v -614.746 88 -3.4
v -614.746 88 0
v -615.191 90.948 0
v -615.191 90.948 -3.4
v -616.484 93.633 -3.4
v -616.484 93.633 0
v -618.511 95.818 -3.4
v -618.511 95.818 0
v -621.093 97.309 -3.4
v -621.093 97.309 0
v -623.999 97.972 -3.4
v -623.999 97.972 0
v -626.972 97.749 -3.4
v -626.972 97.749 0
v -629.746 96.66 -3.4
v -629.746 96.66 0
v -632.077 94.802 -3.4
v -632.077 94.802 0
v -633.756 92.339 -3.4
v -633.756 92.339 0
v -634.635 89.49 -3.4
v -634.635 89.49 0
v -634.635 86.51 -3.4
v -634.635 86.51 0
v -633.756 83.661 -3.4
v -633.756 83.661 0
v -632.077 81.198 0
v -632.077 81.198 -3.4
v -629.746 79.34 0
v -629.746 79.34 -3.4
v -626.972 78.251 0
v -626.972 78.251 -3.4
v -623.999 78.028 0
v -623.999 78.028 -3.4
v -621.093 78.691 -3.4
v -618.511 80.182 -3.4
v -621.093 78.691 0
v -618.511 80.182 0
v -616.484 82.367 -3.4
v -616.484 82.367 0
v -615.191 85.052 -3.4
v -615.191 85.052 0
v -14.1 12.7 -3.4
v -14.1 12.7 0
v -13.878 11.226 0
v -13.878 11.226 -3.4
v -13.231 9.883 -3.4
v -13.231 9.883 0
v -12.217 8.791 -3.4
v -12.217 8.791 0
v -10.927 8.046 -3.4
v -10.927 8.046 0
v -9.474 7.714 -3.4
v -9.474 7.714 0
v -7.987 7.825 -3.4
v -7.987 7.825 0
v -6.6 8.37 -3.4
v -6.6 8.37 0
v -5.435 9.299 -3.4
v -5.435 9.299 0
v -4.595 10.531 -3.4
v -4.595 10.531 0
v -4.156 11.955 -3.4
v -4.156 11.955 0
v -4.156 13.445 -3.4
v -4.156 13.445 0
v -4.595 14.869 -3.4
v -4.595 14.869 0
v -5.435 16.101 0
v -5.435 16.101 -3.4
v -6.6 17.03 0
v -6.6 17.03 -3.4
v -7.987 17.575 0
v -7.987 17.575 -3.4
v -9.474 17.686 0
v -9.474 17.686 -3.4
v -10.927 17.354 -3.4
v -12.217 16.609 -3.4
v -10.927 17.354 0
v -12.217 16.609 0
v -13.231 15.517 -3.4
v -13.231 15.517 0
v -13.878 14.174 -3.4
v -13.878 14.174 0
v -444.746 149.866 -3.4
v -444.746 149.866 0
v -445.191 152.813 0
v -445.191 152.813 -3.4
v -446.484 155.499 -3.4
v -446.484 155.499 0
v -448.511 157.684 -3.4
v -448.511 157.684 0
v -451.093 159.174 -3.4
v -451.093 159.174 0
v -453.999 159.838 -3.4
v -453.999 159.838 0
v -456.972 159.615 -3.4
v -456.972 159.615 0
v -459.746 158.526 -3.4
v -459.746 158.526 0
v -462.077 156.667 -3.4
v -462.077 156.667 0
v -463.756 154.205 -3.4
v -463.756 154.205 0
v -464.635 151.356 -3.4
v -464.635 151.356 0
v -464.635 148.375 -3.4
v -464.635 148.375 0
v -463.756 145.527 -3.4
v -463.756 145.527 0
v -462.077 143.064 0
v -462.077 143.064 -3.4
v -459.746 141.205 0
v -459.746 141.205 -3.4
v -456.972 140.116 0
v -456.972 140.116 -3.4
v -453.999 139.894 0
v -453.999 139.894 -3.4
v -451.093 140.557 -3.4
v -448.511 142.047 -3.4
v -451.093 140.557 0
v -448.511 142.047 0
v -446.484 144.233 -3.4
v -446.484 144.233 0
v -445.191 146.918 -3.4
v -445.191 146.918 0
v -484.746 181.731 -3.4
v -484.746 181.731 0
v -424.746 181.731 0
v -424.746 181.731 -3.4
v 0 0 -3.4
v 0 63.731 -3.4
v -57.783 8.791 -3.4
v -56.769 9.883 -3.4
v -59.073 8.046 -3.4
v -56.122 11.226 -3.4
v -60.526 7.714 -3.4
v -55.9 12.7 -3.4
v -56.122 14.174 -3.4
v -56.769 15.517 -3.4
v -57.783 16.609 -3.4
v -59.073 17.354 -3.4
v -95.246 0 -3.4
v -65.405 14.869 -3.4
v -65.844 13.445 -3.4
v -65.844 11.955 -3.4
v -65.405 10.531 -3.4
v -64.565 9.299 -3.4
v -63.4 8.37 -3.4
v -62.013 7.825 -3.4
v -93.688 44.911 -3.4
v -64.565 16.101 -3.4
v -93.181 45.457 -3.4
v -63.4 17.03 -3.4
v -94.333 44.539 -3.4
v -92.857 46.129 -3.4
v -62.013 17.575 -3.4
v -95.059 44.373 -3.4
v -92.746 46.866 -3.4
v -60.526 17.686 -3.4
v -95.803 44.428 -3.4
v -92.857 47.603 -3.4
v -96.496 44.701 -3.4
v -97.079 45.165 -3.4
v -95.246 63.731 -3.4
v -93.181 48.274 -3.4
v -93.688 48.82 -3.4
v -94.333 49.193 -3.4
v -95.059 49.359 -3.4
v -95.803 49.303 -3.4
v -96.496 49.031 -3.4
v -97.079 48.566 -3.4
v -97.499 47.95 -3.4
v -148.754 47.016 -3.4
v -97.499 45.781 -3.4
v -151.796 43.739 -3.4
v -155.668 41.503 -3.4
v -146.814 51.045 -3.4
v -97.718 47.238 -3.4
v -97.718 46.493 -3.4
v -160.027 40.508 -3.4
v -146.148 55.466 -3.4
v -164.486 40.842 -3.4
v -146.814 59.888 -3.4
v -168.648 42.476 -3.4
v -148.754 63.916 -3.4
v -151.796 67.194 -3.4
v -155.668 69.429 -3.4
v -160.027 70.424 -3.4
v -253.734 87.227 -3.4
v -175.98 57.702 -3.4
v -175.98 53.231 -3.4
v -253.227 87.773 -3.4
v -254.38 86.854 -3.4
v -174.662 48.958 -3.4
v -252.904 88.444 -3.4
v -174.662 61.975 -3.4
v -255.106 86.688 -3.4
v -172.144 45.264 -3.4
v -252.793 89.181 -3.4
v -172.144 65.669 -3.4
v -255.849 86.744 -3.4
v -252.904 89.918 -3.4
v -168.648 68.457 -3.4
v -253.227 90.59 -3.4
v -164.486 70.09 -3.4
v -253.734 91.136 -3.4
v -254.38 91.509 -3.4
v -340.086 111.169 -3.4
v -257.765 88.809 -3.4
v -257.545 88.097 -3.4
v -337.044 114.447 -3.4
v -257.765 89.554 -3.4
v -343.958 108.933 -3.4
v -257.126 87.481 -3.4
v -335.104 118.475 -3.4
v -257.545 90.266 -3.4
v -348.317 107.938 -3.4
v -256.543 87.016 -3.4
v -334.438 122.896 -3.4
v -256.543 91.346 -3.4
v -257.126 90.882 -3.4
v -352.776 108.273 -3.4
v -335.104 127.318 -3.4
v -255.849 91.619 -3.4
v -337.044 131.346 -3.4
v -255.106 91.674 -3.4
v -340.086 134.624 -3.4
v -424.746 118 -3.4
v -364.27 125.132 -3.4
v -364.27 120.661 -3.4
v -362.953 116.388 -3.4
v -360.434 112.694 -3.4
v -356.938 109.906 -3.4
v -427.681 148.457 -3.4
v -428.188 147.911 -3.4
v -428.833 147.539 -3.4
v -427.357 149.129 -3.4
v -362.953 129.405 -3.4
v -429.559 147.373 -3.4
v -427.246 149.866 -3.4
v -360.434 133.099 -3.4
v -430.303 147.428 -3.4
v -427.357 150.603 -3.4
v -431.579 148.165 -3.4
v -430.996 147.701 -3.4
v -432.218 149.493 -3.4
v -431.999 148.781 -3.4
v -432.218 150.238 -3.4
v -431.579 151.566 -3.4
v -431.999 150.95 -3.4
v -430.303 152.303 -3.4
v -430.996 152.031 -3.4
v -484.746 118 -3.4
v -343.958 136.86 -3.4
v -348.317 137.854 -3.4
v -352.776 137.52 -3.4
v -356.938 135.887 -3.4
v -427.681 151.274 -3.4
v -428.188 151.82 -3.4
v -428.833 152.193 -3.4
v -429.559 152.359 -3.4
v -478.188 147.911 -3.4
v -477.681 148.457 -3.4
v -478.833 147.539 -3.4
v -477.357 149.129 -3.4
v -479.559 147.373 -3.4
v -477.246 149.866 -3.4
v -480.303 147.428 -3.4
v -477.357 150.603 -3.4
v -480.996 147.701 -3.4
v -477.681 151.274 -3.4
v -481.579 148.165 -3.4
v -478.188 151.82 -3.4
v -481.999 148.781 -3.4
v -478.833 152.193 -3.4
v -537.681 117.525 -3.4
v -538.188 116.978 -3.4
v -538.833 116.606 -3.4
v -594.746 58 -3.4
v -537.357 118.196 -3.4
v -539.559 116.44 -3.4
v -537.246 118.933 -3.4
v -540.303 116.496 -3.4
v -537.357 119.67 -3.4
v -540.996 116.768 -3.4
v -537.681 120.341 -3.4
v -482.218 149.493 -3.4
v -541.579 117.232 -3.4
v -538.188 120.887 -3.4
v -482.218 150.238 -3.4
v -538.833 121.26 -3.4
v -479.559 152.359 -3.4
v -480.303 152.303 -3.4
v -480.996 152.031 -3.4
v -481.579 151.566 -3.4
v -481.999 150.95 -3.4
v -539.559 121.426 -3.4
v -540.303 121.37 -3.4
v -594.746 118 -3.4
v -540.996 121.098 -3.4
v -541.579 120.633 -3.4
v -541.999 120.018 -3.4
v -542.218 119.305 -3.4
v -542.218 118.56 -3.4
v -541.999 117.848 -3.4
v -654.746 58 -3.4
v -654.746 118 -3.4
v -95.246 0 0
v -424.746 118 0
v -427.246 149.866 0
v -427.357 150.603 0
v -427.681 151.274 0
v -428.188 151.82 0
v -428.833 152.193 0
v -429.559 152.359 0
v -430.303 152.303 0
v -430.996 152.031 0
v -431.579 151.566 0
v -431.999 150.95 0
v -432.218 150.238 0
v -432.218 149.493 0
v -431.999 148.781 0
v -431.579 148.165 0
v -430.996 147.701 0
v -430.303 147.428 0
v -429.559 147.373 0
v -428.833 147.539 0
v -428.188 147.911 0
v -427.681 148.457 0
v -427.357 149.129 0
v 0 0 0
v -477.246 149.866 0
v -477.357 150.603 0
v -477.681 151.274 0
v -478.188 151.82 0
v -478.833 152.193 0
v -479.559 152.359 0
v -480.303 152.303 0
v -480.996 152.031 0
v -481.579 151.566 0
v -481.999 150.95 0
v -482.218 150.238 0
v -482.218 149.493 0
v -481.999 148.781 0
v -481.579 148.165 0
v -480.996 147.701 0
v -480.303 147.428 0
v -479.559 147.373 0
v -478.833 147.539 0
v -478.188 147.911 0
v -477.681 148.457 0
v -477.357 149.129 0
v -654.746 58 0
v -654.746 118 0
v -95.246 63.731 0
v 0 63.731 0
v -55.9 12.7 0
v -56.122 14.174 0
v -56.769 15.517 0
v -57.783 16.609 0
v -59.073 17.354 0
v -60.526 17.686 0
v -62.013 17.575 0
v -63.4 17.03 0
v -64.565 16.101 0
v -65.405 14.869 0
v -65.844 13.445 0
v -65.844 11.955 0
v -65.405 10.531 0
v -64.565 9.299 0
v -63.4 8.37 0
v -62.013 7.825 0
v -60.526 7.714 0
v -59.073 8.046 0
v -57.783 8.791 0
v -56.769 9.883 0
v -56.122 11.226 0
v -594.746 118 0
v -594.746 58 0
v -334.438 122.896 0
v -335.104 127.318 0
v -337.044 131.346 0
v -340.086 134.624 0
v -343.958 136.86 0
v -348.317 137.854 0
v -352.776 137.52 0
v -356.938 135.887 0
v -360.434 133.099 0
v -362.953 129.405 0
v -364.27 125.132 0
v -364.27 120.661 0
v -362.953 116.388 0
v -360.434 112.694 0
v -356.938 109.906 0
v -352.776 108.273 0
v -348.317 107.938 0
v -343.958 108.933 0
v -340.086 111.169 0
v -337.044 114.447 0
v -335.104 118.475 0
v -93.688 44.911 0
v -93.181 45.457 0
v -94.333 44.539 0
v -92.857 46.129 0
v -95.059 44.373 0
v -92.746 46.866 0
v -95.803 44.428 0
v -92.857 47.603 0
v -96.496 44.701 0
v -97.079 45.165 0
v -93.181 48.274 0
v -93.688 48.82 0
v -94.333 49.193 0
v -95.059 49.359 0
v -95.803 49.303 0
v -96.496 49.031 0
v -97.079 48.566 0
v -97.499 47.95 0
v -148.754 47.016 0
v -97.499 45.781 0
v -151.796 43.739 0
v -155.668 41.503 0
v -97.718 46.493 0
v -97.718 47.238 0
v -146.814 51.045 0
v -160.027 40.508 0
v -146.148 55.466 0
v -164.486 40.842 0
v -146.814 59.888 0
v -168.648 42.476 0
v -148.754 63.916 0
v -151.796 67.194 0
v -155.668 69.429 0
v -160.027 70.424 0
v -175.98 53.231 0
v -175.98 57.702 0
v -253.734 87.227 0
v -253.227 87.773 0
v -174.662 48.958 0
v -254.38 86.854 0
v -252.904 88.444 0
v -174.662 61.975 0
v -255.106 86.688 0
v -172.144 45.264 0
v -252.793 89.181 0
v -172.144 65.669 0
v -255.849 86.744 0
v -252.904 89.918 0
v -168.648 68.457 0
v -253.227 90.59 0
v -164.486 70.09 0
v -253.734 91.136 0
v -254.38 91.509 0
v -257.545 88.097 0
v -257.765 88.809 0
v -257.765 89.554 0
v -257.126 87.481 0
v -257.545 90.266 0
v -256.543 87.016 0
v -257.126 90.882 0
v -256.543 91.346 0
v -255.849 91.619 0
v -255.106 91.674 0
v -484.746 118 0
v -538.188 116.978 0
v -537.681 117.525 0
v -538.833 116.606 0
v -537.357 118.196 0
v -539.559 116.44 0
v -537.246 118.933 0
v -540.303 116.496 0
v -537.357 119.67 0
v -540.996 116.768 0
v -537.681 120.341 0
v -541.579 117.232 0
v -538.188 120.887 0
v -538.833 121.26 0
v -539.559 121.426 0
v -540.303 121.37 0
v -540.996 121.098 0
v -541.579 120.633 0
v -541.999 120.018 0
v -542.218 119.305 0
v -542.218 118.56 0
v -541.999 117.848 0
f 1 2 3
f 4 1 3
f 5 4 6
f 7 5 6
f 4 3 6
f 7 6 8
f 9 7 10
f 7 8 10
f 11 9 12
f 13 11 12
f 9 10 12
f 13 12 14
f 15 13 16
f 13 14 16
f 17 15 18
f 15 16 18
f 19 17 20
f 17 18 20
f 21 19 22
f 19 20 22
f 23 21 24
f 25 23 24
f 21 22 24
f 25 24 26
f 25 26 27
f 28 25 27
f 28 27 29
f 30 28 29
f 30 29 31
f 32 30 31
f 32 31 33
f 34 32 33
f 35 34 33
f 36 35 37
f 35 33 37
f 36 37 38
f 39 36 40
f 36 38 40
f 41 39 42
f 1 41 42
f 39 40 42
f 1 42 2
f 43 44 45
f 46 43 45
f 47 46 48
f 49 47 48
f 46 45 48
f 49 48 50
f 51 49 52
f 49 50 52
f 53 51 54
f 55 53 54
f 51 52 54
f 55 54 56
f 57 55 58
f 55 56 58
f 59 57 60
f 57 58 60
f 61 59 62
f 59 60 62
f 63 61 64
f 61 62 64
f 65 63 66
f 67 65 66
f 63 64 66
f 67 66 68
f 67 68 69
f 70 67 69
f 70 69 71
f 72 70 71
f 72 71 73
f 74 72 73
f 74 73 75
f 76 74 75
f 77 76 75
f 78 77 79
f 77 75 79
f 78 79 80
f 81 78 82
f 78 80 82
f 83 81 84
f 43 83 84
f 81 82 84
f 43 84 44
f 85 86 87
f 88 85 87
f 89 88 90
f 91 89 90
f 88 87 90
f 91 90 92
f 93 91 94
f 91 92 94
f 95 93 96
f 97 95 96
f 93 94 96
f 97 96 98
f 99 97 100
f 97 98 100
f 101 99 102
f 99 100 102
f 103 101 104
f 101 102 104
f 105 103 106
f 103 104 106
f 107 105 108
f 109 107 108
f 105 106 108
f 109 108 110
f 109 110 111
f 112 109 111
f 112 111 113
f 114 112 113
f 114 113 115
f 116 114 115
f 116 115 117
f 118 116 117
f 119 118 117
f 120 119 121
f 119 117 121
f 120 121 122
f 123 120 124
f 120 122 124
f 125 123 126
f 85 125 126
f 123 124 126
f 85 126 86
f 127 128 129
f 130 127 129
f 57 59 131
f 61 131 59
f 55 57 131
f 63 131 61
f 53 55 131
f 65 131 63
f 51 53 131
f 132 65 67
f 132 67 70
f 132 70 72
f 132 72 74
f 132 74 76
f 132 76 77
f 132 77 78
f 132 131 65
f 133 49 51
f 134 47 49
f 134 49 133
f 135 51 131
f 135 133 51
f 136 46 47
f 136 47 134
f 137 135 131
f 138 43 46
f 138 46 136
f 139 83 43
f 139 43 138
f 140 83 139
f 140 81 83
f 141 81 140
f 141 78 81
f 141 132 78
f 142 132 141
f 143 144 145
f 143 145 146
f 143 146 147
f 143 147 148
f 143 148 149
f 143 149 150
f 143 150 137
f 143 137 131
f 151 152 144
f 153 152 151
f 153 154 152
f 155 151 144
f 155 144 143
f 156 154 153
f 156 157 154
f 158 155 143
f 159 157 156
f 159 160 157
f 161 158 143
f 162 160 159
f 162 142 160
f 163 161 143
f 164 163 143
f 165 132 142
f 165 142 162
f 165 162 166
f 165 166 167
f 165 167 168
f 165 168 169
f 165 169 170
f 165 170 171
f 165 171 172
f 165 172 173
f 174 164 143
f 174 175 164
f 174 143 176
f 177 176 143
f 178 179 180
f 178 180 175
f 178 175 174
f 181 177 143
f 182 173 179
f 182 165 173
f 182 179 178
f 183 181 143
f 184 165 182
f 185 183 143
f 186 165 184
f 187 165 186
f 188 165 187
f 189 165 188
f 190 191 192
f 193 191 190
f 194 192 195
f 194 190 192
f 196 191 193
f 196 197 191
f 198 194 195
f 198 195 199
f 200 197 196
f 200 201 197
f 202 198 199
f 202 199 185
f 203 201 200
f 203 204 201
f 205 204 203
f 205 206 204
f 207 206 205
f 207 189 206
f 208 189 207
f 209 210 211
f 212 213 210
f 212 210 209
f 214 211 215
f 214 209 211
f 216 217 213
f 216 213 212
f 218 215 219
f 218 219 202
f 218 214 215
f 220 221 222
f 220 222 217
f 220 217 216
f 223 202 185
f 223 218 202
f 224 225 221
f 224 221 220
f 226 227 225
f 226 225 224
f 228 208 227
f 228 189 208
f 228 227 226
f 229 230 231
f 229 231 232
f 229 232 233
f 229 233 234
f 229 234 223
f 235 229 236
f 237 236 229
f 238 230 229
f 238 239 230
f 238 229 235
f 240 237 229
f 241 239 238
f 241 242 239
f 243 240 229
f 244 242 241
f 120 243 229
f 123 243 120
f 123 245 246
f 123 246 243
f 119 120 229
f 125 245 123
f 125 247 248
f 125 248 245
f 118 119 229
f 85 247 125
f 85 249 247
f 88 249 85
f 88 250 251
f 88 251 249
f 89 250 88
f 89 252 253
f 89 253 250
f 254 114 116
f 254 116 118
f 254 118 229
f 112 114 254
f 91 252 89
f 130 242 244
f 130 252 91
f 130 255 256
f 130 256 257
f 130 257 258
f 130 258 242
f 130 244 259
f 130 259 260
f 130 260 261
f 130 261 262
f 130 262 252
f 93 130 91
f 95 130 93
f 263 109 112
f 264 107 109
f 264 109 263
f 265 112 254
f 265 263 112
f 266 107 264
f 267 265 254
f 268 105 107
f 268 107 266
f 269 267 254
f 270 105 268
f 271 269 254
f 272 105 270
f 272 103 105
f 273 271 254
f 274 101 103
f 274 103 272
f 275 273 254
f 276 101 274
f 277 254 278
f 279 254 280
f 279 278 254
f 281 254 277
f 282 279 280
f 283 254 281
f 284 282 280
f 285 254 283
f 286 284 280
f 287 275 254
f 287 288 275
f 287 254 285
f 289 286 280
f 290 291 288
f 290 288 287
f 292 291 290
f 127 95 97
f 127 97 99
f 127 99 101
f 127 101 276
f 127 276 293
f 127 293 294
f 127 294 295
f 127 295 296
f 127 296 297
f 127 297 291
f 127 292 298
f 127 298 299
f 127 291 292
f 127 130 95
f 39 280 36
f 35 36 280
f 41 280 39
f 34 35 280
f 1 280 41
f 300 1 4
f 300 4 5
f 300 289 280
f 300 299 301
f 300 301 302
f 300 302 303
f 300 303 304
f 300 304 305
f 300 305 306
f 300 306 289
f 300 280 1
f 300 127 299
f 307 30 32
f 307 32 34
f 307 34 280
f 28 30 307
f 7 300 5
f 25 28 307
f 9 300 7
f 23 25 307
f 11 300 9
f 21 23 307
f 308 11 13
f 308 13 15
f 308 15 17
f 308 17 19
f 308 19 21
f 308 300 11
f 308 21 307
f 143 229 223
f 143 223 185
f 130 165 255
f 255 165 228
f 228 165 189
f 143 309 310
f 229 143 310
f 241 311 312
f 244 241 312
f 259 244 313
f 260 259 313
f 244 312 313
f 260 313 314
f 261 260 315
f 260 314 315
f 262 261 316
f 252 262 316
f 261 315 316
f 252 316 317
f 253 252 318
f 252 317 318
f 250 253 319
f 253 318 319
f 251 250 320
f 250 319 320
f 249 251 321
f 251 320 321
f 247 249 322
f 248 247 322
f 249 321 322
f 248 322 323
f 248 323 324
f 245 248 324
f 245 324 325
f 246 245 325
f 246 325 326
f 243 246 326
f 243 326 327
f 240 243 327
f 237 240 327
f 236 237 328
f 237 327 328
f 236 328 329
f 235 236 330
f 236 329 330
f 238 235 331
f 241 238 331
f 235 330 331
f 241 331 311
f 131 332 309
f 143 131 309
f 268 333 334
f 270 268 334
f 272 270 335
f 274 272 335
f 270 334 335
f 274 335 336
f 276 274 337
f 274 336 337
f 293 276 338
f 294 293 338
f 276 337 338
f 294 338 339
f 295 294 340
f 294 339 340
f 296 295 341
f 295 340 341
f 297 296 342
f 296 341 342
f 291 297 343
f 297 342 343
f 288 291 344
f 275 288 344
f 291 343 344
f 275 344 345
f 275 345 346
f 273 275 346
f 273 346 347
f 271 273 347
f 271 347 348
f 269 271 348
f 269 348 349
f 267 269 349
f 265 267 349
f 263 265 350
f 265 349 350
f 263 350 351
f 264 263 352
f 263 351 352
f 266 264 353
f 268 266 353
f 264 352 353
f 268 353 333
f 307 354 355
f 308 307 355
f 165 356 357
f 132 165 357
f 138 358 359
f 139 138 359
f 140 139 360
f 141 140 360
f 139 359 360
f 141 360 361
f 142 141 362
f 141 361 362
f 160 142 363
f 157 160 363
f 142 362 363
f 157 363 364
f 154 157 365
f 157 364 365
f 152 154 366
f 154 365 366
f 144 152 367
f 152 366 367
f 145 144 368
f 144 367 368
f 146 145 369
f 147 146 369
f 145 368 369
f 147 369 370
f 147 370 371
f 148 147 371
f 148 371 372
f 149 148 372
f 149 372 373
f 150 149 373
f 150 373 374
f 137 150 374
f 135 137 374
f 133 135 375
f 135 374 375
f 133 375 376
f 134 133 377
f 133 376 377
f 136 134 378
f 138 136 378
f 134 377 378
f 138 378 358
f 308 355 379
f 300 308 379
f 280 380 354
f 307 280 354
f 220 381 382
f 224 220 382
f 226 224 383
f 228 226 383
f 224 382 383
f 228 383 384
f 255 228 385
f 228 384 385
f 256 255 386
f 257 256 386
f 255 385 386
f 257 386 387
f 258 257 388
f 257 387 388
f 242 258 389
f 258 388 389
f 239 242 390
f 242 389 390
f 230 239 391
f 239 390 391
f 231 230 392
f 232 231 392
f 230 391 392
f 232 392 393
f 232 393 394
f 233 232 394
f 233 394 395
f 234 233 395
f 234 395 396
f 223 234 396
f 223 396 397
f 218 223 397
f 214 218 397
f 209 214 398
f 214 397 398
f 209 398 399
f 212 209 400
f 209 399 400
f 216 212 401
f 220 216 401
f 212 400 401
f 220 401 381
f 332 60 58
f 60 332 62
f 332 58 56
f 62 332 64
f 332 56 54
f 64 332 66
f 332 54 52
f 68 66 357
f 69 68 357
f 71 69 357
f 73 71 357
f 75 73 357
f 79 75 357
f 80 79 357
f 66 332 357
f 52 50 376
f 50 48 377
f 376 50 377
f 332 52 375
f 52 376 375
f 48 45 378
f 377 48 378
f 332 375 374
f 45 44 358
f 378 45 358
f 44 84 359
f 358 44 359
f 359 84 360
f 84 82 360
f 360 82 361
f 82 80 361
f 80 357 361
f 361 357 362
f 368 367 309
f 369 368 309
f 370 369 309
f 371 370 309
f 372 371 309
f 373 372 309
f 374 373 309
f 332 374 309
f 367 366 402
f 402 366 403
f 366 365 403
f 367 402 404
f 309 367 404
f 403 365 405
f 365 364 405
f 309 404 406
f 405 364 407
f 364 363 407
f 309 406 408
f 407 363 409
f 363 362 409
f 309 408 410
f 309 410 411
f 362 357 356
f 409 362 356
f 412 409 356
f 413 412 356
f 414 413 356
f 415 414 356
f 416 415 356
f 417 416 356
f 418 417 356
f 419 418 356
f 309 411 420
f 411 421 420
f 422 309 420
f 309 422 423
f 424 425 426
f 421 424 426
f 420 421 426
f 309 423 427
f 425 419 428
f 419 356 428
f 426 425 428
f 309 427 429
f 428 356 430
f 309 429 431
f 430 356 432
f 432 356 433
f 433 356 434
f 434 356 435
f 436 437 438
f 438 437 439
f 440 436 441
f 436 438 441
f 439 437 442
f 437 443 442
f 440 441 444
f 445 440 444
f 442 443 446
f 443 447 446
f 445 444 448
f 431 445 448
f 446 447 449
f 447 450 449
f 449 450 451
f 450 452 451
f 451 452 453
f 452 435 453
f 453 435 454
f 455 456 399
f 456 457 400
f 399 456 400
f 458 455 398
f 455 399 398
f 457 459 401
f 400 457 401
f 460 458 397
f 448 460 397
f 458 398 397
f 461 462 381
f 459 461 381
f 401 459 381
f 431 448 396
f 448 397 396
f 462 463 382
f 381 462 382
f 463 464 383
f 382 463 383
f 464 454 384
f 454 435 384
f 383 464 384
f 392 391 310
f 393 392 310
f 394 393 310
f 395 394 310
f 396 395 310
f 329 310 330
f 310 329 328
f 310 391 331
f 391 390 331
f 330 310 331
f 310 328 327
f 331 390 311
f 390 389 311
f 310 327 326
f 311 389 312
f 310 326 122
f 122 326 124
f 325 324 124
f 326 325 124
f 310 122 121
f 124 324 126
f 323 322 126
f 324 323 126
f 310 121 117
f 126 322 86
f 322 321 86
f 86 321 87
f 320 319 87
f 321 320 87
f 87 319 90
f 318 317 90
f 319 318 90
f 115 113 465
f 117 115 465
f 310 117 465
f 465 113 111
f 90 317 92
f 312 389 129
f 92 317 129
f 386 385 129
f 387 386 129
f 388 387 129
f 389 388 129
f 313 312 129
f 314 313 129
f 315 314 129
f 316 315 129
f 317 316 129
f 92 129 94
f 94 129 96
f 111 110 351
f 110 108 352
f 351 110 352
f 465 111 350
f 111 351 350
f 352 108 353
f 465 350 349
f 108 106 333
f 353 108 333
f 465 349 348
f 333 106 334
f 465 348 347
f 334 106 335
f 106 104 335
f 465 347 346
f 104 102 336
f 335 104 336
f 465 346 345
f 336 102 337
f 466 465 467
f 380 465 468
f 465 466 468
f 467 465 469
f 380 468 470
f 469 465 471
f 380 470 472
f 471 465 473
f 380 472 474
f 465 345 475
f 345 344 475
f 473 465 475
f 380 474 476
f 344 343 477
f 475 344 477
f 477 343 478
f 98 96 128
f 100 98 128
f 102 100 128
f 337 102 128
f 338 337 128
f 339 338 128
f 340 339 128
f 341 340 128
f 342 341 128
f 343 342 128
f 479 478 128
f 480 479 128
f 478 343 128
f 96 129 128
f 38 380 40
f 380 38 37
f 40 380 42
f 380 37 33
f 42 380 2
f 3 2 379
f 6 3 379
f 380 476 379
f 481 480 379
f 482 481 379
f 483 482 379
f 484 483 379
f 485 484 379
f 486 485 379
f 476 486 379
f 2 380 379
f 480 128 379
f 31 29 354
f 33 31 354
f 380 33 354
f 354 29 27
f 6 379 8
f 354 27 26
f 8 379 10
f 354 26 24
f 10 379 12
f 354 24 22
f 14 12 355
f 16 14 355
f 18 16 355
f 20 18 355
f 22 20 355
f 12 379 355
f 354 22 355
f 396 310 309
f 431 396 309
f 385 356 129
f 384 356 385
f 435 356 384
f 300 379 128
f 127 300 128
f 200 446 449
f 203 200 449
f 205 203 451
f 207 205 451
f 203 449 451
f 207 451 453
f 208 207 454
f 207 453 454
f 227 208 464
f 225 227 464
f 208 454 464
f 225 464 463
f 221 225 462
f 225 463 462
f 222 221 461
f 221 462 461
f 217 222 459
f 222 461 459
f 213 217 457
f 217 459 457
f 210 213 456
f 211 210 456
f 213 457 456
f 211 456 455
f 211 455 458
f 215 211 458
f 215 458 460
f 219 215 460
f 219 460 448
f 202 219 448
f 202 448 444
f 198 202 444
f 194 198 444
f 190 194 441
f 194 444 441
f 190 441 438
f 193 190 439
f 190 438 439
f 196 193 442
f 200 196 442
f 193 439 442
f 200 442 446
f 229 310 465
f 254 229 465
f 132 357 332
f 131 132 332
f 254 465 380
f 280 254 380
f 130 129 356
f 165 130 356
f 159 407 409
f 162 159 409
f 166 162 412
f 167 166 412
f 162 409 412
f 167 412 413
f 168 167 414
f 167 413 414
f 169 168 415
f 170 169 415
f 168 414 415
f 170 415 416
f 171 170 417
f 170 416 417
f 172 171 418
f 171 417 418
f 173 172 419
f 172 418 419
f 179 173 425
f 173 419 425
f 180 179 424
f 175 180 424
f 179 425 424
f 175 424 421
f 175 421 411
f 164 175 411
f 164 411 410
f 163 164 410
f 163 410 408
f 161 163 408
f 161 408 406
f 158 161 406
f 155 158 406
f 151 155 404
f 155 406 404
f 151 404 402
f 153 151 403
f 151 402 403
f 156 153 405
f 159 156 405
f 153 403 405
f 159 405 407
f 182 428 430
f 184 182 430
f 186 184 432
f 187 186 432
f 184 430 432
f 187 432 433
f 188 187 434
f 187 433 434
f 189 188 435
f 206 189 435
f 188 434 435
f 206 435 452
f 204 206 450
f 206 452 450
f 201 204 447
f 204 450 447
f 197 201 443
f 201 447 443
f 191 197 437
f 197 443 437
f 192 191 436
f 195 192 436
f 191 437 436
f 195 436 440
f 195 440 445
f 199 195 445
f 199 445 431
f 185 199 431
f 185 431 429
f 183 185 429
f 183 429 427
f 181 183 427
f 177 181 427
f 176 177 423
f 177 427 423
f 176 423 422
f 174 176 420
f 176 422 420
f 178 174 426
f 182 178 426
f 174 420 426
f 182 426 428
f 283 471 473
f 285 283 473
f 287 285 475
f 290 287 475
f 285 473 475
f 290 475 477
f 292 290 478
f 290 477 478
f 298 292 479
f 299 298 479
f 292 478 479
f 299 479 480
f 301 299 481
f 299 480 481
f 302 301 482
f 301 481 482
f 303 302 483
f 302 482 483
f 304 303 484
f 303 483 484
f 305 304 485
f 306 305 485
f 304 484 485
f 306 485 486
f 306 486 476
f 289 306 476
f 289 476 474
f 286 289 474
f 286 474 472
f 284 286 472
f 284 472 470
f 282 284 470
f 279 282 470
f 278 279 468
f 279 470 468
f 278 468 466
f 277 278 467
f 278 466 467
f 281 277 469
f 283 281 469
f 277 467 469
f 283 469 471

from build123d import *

# Parameters (mm, degrees)
SKETCH1_R          = 10
SKETCH1_R_2        = 2.5
SKETCH1_R_3        = 15
SKETCH1_R_4        = 5
BASE_FLANGE1_DEPTH = 3.4


# Sheet-metal steps are written as plain solids
with BuildPart() as part:
    # Sketch1 → Base-Flange1 (new body)
    with BuildSketch(Plane.XY):
        Polygon((0, 63.731432889), (0, 0), (-95.246303627, 0), (-424.746303627, 118), (-484.746303627, 118), (-594.746303627, 58), (-654.746303627, 58), (-654.746303627, 118), (-594.746303627, 118), (-484.746303627, 181.731432889), (-424.746303627, 181.731432889), (-95.246303627, 63.731432889), align=None)
        with Locations((-624.746303627, 88)):
            Circle(SKETCH1_R, mode=Mode.SUBTRACT)
        with Locations((-454.746303627, 149.865716445)):
            Circle(SKETCH1_R, mode=Mode.SUBTRACT)
        with Locations((-539.746303627, 118.932858222)):
            Circle(SKETCH1_R_2, mode=Mode.SUBTRACT)
        with Locations((-161.147850314, 55.466270342)):
            Circle(SKETCH1_R_3, mode=Mode.SUBTRACT)
        with Locations((-255.29291701, 89.181347338)):
            Circle(SKETCH1_R_2, mode=Mode.SUBTRACT)
        with Locations((-349.437983706, 122.896424333)):
            Circle(SKETCH1_R_3, mode=Mode.SUBTRACT)
        with Locations((-429.746303627, 149.865716445)):
            Circle(SKETCH1_R_2, mode=Mode.SUBTRACT)
        with Locations((-479.746303627, 149.865716445)):
            Circle(SKETCH1_R_2, mode=Mode.SUBTRACT)
        with Locations((-60.9, 12.7)):
            Circle(SKETCH1_R_4, mode=Mode.SUBTRACT)
        with Locations((-95.246303627, 46.865716445)):
            Circle(SKETCH1_R_2, mode=Mode.SUBTRACT)
        with Locations(Location((-9.1, 12.7, 0), (0, 0, 180))):
            Circle(SKETCH1_R_4, mode=Mode.SUBTRACT)
    extrude(amount=-BASE_FLANGE1_DEPTH)


solid = part.part
